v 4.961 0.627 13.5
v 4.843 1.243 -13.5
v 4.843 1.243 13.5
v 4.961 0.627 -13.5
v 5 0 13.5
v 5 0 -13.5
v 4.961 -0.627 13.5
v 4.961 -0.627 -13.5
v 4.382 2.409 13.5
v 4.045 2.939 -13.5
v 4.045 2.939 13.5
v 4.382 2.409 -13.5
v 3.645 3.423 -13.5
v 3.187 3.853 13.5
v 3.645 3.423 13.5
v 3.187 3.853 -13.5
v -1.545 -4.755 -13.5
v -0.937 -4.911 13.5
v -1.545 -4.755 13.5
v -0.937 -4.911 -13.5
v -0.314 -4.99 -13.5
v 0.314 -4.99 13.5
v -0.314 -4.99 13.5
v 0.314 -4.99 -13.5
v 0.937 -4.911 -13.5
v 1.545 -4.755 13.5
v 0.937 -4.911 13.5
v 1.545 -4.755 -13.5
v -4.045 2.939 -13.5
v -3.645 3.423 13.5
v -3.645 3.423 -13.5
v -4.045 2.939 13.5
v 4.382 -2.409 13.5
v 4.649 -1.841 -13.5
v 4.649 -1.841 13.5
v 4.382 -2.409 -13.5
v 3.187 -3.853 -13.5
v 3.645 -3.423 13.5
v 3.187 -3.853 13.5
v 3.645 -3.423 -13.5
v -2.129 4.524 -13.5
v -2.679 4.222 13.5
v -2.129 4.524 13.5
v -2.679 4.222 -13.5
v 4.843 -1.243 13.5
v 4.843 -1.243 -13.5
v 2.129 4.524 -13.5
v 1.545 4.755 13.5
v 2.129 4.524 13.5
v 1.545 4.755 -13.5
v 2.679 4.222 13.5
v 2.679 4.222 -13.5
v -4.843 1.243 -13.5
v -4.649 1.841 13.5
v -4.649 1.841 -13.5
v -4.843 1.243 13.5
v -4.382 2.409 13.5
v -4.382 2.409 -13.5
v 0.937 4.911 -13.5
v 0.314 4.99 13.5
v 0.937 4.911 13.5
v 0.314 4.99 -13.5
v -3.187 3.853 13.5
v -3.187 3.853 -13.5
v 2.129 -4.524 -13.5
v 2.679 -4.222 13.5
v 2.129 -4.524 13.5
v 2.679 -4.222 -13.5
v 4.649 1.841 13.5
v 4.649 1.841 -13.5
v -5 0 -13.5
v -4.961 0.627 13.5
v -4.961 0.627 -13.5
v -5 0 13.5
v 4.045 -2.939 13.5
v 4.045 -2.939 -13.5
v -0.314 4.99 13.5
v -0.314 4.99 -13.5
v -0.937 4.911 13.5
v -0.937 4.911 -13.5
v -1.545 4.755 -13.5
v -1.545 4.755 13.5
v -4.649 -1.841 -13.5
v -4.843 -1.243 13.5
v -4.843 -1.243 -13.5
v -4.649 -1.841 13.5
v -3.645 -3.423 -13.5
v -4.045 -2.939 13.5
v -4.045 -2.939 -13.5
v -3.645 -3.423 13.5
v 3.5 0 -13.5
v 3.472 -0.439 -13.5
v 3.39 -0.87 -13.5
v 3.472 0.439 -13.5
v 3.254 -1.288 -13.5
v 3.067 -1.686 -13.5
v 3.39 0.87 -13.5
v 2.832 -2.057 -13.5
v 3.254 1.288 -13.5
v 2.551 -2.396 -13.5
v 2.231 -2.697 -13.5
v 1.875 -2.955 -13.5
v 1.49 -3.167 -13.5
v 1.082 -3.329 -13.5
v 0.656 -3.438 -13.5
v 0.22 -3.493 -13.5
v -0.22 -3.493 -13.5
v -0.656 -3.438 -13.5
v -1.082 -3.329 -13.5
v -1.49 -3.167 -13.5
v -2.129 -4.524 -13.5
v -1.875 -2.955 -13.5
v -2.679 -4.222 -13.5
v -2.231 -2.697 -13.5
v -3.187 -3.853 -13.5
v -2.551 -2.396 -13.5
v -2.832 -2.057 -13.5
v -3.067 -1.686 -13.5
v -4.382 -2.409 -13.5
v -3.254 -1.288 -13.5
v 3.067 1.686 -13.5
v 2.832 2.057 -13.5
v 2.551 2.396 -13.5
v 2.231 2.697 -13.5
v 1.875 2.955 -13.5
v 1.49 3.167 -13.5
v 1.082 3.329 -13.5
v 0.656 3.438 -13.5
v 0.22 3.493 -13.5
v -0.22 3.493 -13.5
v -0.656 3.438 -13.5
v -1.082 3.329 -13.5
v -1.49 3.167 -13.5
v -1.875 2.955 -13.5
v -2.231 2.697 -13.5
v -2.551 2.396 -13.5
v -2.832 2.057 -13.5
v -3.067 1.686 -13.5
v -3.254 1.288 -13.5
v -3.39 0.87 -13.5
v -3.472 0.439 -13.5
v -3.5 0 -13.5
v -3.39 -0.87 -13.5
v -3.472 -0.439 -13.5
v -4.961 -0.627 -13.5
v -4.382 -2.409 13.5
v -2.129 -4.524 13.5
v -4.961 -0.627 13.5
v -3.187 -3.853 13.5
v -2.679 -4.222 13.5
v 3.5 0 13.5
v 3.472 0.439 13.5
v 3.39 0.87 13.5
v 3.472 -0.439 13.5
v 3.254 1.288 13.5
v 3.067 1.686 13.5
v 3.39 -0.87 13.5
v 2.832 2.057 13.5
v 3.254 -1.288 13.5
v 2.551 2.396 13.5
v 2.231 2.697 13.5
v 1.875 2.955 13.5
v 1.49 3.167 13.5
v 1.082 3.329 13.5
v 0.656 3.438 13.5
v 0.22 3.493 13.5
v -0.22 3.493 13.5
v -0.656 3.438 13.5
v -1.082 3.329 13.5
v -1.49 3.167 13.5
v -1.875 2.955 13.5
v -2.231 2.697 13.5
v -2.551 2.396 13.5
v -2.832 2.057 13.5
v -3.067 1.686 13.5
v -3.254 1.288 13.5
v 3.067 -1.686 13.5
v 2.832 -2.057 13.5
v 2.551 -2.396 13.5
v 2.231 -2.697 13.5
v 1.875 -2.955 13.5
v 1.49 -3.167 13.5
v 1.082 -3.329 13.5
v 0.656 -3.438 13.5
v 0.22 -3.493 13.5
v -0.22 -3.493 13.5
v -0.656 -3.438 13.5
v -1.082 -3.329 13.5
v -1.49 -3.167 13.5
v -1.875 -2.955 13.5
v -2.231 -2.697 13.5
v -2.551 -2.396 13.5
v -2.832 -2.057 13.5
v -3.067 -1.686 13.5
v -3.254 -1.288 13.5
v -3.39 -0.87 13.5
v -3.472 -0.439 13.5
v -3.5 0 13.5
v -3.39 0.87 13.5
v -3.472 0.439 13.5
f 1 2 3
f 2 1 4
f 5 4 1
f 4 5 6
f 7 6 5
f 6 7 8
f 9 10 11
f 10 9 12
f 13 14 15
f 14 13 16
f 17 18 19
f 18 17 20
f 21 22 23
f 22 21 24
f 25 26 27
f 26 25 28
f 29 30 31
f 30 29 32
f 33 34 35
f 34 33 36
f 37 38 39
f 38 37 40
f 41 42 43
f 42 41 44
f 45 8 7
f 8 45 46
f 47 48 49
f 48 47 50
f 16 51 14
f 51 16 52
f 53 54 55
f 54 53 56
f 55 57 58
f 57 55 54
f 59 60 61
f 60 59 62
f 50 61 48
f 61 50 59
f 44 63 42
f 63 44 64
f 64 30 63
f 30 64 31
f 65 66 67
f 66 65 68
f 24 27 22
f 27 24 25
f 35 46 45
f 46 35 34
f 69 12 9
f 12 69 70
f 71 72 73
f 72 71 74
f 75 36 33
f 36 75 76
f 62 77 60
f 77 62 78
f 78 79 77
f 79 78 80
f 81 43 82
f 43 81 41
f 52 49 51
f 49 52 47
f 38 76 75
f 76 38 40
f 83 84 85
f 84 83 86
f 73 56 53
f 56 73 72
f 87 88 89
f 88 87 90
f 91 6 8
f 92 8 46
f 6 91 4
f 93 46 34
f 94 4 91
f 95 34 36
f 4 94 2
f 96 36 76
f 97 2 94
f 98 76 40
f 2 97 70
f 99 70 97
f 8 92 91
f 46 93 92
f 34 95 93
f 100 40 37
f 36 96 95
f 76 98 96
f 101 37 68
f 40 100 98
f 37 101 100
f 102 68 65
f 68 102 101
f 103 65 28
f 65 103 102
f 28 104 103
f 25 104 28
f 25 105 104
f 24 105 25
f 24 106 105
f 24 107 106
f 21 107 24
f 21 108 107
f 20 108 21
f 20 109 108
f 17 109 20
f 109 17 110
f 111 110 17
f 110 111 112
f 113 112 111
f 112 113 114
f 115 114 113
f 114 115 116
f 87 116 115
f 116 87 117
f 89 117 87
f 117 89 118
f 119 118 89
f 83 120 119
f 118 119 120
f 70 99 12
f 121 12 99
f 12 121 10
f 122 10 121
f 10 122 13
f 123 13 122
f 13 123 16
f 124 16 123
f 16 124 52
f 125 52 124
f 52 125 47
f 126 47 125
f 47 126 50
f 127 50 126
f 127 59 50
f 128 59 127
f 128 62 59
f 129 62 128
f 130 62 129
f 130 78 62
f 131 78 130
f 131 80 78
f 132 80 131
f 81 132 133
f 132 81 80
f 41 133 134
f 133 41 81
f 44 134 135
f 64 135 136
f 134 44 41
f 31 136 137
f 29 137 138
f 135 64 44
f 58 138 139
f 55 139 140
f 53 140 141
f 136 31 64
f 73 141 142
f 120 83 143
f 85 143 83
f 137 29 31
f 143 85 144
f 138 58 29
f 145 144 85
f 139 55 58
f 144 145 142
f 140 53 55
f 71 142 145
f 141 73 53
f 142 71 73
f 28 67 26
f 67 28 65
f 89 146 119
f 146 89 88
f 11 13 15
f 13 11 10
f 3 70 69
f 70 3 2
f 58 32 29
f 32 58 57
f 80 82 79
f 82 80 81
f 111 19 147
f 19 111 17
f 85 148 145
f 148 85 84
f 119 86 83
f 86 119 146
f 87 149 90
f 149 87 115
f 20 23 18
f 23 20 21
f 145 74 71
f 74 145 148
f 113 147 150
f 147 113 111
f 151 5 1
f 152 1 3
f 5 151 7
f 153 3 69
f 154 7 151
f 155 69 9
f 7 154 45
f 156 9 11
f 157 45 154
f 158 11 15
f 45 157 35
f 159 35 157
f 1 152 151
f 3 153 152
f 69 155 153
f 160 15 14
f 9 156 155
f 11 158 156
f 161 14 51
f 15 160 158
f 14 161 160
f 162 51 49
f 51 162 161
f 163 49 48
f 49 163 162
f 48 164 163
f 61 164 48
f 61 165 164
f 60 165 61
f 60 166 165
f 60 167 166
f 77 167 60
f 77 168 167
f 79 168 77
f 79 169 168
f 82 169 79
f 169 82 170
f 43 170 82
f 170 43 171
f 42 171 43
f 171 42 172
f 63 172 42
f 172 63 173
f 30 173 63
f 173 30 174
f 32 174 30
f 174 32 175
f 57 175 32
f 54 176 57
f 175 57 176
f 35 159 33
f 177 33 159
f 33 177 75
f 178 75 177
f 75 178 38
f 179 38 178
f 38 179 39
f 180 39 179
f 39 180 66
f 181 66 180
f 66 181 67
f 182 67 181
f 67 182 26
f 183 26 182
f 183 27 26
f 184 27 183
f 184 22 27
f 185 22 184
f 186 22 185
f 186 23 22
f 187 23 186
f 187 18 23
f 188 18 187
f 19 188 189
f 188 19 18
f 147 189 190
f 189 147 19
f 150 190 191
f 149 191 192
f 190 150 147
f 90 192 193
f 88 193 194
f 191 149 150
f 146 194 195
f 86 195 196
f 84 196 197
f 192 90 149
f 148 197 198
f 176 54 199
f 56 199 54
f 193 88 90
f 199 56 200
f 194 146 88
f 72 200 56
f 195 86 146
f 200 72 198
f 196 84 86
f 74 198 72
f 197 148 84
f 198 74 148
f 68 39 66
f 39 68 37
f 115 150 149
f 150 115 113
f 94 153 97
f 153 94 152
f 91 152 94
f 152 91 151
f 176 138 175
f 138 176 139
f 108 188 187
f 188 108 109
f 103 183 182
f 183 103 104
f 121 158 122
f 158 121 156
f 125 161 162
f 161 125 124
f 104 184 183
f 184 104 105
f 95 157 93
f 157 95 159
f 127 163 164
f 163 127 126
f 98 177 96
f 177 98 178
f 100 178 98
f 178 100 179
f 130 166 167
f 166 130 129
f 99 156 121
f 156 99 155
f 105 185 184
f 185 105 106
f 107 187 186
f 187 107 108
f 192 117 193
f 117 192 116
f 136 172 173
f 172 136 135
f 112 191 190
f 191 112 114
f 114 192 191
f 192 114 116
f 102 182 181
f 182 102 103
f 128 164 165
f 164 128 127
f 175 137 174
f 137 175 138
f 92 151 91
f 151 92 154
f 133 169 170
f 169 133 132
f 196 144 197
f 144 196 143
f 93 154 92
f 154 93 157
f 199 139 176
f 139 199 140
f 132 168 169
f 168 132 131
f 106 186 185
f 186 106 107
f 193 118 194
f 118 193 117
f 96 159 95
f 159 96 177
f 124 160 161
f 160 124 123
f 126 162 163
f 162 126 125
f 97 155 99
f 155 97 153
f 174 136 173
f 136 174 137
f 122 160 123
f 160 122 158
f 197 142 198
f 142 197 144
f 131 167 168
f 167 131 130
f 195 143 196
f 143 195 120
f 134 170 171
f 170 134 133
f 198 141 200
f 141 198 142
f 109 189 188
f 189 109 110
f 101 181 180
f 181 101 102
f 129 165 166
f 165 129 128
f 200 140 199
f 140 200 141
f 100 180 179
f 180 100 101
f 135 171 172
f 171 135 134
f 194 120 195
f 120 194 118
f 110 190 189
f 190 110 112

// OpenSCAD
$fn = 50;


difference() {
	union() {
		translate(v = [0, 0, -13.5000000000]) {
			cylinder(h = 27, r = 5.0000000000);
		}
	}
	union() {
		translate(v = [0, 0, -100.0000000000]) {
			cylinder(h = 200, r = 3.5000000000);
		}
	}
}
